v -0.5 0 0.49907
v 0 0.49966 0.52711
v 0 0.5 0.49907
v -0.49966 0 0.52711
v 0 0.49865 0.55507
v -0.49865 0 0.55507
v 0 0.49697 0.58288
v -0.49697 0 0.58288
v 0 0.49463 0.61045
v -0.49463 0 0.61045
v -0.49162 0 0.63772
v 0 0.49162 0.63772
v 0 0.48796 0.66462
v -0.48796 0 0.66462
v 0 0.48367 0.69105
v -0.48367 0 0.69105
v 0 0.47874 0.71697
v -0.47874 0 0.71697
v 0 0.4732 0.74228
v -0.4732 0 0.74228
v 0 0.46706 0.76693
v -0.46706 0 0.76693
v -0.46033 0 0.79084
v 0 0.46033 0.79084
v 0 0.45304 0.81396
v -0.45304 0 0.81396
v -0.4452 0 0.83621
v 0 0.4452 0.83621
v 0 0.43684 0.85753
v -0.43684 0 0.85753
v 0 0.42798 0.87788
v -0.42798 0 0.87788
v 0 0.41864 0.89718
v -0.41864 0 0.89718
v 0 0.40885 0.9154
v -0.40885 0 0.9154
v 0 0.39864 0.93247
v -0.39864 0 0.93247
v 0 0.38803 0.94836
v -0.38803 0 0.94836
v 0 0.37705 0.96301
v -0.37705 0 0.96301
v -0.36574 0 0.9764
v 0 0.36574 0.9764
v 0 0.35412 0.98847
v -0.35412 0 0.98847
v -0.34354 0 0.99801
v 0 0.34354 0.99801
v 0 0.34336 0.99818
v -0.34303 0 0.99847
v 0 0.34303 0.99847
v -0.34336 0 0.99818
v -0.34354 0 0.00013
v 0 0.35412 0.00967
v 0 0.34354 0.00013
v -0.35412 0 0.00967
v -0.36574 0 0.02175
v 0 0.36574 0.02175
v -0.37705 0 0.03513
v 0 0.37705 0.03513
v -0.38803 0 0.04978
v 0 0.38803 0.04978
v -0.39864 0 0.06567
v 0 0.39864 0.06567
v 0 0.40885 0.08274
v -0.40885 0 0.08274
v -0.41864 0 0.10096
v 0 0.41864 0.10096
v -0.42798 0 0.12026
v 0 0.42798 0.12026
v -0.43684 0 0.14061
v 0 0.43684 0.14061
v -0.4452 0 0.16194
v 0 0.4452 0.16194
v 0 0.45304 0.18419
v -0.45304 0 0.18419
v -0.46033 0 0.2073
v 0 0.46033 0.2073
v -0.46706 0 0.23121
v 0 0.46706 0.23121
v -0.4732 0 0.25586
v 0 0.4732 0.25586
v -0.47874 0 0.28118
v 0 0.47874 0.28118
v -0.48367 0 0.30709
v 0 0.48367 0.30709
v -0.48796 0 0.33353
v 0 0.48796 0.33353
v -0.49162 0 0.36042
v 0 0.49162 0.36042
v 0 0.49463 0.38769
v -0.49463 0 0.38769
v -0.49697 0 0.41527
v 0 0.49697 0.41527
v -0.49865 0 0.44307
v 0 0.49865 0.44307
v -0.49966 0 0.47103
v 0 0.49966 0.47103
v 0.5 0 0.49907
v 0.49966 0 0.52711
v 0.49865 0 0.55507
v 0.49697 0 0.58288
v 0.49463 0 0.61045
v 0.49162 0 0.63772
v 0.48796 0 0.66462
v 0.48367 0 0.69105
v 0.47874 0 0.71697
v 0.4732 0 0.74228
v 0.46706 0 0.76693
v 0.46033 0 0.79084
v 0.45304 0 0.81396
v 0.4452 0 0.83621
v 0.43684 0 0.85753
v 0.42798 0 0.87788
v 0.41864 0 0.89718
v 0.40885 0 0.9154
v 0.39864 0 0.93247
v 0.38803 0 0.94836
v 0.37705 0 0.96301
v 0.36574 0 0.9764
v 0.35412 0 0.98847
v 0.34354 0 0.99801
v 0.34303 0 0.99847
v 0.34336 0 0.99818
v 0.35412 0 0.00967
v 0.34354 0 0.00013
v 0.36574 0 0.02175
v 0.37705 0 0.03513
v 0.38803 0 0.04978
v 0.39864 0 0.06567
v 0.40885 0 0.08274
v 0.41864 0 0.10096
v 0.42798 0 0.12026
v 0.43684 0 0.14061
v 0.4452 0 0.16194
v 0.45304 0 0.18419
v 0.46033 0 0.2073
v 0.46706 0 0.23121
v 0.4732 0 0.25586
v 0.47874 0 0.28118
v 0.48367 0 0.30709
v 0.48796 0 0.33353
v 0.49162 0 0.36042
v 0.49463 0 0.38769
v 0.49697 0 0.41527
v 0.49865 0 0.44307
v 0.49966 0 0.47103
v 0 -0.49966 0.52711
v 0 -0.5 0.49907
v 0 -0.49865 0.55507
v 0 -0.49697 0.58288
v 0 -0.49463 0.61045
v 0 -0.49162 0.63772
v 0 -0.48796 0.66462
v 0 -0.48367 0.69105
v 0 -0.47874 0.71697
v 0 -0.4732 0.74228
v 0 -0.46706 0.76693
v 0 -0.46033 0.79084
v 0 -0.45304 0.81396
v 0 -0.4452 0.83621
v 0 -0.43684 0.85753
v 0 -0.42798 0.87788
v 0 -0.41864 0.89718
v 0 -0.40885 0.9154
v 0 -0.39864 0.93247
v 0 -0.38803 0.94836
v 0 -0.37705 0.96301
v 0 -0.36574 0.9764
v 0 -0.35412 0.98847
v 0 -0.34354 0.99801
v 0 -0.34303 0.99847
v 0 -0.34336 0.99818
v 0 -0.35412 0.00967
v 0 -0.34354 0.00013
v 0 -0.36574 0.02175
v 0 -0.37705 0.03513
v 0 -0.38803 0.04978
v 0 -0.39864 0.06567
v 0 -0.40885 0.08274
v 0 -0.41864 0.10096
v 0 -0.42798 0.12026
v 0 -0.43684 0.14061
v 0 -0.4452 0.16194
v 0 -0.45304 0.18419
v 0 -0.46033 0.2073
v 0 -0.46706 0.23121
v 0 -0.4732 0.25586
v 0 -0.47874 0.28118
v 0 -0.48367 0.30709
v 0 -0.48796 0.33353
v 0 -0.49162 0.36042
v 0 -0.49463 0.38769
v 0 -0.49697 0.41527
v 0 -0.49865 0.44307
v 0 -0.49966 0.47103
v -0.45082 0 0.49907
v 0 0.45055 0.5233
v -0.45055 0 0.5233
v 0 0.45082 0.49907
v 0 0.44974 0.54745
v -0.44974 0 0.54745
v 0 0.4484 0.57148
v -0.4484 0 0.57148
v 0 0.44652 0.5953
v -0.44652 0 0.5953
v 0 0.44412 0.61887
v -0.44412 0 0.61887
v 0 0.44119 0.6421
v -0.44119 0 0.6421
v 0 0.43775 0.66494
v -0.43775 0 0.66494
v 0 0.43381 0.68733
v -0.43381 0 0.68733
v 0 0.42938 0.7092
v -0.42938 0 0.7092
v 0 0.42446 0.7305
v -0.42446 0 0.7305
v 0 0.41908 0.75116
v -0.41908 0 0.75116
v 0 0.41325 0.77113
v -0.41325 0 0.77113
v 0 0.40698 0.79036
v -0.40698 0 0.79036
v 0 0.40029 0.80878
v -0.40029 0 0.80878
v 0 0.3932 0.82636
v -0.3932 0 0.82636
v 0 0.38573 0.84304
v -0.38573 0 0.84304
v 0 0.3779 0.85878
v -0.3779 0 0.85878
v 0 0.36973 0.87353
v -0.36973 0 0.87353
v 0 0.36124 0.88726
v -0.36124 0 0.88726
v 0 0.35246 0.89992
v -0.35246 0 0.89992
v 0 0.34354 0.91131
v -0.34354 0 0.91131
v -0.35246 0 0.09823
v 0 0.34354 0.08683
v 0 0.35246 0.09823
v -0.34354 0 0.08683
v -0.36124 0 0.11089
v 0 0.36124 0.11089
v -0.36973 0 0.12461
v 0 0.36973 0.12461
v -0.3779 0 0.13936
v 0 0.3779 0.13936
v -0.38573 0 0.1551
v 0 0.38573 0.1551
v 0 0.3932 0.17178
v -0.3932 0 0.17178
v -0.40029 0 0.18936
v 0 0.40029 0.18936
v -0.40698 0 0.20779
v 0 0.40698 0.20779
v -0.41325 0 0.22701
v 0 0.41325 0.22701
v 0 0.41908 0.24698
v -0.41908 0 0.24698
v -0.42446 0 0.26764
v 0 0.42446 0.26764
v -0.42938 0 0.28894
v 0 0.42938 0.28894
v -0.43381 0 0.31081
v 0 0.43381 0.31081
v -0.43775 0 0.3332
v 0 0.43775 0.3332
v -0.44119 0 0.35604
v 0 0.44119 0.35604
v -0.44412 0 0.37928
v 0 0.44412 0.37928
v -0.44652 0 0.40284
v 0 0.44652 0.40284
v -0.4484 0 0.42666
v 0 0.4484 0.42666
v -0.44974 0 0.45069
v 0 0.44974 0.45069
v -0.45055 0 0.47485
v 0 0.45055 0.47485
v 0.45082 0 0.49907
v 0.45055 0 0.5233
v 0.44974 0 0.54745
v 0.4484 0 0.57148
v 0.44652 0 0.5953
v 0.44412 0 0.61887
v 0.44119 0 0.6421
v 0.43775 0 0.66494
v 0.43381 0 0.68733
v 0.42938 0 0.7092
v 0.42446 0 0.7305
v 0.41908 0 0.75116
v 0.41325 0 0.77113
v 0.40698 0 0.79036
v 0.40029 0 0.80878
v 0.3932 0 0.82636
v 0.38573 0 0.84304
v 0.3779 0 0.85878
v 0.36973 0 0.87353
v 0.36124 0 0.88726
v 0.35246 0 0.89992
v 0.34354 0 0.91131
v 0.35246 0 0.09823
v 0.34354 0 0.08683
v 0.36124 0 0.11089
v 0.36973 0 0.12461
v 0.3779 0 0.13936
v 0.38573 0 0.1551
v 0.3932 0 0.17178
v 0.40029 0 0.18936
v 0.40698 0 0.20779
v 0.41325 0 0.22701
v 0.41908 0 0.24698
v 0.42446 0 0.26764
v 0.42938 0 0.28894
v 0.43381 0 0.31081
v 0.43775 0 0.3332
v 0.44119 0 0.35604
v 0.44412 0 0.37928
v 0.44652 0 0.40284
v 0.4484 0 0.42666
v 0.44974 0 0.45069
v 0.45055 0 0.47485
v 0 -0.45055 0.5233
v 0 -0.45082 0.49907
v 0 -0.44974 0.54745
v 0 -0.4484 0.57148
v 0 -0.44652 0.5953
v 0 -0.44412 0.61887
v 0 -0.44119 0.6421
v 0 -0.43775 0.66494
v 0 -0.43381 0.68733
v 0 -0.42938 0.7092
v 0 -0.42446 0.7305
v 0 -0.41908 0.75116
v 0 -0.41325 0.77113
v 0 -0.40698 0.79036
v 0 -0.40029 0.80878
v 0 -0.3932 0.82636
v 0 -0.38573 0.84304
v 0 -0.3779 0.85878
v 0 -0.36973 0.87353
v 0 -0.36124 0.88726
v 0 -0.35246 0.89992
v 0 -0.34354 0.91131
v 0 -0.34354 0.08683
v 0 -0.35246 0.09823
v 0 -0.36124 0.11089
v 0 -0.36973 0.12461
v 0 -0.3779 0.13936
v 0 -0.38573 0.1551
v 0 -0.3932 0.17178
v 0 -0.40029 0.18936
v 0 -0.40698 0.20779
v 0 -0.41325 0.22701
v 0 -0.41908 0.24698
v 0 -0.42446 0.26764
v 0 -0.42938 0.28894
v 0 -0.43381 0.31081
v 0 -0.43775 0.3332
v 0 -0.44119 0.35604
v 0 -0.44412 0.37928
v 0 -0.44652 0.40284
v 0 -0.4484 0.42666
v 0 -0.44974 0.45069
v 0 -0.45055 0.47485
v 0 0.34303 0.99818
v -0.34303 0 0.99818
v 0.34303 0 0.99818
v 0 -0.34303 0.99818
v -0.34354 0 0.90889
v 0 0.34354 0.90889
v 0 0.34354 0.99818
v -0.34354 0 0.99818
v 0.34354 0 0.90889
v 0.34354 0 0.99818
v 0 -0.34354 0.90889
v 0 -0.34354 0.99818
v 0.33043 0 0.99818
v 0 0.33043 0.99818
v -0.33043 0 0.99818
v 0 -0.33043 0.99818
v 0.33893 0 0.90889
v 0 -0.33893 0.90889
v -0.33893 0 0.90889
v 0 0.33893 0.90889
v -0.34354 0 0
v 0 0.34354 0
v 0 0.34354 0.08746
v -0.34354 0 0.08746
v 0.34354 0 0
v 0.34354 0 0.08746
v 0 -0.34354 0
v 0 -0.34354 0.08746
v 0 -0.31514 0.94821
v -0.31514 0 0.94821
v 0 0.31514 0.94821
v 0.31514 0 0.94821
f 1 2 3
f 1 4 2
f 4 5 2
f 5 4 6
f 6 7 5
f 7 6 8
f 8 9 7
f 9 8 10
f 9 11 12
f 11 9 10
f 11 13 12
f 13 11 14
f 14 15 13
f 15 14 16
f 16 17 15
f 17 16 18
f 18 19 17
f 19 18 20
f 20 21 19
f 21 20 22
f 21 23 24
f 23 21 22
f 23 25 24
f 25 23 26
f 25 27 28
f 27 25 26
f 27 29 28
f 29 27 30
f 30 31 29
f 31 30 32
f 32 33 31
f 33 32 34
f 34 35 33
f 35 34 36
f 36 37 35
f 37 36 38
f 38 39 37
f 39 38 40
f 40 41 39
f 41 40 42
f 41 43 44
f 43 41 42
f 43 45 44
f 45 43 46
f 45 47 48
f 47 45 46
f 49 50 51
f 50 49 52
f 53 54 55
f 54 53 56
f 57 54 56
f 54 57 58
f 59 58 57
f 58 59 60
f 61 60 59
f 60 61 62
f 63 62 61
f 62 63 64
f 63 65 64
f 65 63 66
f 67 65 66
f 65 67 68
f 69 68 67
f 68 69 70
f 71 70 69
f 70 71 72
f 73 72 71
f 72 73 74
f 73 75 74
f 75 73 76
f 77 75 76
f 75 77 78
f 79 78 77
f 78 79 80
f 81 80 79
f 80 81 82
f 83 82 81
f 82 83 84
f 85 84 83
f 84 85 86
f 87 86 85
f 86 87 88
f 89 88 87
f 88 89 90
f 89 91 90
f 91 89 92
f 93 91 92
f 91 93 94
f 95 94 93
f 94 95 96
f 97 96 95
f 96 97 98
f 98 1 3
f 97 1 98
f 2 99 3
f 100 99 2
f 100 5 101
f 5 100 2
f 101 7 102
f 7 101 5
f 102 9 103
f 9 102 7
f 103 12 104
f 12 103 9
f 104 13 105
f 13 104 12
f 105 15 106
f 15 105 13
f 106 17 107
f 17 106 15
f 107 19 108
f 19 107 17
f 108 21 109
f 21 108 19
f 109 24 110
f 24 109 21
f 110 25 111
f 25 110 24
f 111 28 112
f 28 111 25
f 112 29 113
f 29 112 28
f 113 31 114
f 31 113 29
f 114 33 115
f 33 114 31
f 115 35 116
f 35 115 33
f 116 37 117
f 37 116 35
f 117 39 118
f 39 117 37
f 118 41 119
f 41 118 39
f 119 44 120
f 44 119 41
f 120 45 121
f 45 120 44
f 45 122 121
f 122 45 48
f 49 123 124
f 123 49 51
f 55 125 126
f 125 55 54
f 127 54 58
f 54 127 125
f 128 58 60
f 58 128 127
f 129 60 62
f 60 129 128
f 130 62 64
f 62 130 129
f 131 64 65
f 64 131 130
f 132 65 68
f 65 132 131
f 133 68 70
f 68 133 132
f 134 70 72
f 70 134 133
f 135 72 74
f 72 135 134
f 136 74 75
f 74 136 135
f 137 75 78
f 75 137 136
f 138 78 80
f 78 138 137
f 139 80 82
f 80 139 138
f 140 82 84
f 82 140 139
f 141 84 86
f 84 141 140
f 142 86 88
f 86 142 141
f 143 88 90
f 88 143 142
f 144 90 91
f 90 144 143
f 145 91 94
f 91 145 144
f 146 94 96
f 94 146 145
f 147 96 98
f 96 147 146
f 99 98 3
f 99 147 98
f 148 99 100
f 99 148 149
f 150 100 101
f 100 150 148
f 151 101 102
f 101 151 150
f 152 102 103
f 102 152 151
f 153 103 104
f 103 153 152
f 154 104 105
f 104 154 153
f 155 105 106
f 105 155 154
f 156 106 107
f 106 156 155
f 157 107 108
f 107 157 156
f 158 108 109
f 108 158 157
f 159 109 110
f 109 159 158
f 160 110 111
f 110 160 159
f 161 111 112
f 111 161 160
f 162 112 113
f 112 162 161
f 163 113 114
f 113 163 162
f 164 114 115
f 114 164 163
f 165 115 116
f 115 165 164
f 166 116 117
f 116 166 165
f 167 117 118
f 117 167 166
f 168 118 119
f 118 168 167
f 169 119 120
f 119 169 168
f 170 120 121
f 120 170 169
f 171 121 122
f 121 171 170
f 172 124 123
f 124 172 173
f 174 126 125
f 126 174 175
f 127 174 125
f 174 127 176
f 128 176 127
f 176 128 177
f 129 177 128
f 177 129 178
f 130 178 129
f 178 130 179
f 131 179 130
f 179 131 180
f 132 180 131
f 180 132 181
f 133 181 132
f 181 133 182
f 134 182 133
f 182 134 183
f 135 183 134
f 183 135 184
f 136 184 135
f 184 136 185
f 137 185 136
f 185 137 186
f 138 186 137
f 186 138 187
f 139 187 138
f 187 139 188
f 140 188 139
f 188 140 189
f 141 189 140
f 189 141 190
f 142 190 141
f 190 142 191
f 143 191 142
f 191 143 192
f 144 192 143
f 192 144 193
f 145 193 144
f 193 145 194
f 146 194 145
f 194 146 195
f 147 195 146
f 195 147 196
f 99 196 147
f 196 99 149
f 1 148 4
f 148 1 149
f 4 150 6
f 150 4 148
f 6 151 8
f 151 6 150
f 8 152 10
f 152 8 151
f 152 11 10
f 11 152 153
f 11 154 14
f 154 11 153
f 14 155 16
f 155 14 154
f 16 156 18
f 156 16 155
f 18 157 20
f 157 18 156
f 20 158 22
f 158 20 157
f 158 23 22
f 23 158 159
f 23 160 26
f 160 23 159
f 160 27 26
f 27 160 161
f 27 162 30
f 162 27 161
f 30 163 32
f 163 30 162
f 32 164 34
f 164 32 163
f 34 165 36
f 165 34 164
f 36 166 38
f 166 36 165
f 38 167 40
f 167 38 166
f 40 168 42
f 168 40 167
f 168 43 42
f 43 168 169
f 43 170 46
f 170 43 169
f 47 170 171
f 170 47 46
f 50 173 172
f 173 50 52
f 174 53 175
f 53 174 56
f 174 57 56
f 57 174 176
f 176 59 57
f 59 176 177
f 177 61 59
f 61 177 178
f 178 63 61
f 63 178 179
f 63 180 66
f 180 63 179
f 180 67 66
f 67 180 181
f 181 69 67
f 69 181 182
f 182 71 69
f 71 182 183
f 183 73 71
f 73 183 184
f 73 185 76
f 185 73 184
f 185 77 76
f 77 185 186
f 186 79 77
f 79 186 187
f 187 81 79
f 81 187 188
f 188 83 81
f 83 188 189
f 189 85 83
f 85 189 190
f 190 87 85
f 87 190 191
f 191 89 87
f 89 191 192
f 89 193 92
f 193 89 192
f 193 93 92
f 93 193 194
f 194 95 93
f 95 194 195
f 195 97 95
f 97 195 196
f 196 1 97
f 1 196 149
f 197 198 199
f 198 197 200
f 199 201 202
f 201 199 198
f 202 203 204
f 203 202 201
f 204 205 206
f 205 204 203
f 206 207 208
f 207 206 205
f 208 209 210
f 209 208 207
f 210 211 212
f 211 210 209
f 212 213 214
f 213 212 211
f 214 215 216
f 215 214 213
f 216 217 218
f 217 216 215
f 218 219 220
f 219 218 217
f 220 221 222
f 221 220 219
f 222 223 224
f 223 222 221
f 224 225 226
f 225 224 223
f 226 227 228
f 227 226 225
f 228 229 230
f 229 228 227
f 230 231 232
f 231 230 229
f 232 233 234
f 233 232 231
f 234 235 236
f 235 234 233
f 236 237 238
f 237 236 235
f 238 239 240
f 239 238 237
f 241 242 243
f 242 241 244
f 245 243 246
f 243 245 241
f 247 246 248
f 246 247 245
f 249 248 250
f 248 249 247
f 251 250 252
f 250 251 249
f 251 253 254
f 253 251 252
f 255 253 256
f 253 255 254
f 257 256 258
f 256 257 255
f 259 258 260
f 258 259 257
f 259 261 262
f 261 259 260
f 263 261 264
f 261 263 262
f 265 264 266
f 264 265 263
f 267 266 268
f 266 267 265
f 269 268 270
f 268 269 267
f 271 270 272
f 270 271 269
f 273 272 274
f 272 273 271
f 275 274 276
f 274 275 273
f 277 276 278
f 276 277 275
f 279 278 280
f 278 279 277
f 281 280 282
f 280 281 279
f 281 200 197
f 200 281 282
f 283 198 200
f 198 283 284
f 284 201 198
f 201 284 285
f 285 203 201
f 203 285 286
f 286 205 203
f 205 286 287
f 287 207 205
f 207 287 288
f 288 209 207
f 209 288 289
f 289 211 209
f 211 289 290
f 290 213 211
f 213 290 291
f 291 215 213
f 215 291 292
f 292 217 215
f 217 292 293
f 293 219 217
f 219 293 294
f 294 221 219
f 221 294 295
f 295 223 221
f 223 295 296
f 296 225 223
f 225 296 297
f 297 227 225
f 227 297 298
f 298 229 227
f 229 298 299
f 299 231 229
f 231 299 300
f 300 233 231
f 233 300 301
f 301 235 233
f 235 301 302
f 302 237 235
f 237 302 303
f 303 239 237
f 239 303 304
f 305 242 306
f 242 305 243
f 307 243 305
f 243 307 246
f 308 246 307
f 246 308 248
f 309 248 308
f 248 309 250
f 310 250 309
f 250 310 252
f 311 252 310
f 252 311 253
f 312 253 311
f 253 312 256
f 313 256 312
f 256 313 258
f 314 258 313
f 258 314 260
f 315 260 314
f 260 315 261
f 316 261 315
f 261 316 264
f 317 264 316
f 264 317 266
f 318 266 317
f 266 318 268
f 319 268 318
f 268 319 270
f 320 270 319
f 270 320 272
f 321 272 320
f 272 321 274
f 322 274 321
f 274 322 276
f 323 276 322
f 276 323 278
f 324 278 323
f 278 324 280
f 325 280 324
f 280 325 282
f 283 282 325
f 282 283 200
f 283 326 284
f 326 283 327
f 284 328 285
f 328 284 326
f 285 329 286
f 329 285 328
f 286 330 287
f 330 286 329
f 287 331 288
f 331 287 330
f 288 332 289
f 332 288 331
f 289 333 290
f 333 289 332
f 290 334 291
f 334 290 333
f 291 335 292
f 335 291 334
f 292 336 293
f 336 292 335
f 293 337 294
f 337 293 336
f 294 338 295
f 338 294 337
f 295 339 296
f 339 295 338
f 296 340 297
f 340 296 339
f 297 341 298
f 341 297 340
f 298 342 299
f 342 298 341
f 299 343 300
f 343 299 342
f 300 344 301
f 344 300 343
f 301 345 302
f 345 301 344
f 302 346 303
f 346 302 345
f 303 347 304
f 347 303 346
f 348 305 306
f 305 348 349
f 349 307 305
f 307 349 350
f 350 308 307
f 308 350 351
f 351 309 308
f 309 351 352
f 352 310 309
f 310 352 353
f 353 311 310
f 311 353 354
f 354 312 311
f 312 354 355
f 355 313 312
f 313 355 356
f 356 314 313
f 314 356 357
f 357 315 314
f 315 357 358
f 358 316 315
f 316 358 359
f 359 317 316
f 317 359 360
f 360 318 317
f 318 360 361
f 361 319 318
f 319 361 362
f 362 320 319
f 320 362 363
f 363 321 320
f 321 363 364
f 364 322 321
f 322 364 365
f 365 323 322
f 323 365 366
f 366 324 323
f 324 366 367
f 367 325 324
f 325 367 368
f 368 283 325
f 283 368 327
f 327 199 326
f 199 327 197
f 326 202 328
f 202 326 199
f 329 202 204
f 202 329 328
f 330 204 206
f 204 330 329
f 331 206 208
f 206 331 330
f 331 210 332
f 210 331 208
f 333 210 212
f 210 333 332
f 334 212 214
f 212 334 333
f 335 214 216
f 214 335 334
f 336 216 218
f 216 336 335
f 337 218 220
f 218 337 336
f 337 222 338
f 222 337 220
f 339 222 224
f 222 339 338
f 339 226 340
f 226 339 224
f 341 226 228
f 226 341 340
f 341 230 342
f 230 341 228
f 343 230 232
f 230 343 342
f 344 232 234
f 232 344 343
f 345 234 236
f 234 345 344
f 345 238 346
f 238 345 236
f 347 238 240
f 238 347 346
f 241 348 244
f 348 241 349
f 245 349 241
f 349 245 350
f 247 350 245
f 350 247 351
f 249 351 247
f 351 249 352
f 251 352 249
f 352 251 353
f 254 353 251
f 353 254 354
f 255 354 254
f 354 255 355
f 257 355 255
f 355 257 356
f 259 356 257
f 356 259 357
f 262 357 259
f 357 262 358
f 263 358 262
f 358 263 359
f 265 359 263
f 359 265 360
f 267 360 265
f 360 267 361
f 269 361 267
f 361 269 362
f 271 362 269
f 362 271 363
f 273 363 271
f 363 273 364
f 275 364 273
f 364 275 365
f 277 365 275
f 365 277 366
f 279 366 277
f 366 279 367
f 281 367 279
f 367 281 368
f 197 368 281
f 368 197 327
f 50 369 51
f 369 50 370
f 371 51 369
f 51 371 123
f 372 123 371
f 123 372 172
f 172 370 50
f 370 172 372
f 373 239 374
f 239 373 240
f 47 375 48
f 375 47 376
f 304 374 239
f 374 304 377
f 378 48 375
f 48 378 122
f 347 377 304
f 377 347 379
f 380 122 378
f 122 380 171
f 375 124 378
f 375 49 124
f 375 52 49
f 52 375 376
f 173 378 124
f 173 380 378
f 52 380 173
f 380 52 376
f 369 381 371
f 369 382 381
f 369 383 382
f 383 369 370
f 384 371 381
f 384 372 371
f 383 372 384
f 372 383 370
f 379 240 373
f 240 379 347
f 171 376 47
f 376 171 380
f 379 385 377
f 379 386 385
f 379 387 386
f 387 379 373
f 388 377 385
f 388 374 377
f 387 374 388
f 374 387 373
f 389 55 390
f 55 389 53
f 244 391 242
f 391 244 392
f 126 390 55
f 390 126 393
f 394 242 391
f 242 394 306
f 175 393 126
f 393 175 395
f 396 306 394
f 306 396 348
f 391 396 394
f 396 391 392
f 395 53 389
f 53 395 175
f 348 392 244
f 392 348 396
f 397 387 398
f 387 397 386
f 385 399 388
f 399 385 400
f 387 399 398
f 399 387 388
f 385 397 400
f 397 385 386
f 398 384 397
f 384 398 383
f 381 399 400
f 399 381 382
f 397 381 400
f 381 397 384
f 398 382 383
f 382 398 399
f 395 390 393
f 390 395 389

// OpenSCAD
// The shape of pot you'd like
potShape = 0; // [0:14]

// The number of sides (0 for Cylindrical)
numberSides = 4; // [0:100]

drawReceptacle(potShape,numberSides);

module hSphere(r=1,t=0.1,ns,rot) {
	difference() {
		sphere(r);
		sphere(r-t);
	}
}

rotationList=[0,0,0,60,0,-36,60,180/7,0,-20,36,180/11,0,-180/13,180/7,12,0,0,0,0,0,0];

module drawReceptacle(number,sides) {
	ns=(sides<3)?100:sides;
	rotby=(ns>20)?0:rotationList[ns];

		if (number==1) { receptacle3(ns,rotby);
	} else if (number==2) { receptacle1(ns,rotby);
	} else if (number==3) { receptacle2(ns,rotby);
	} else if (number==4) { receptacle5(ns,rotby);
	} else if (number==5) { receptacle6(ns,rotby);
	} else if (number==6) { receptacle7(ns,rotby);
	} else if (number==7) { receptacle4(ns,rotby);
	} else if (number==8) { receptacle8(ns,rotby);
	} else if (number==9) { receptacle9(ns,rotby);
	} else if (number==10) { receptacle10(ns,rotby);
	} else if (number==11) { receptacle11(ns,rotby);
	} else if (number==12) { receptacle14(ns,rotby);
	} else if (number==13) { receptacle12(ns,rotby);
	} else if (number==14) { receptacle13(ns,rotby);
	} else { 
		 receptacle0(ns,rotby);
	}	
}

diameter=50;
height=100;
quality=120;
$fn=quality;
numbsides=100; rotation=0;


module hSphere(r=1,t=0.1,ns,rot) {
	difference() {
		sphere(r);
		sphere(r-t);
	}
}
module hTorus(r=1,t=0.1,ns,rot) {
	scale([1,1,2])difference() {
		rotate([0,0,rot]) rotate_extrude(convexity=15,$fn=ns) translate([r*2/3, 0, 0]) circle(r/3,$fn=quality); 
		rotate([0,0,rot]) scale([1,1,1.2])rotate_extrude(convexity=15,$fn=ns) translate([r*2/3, 0, 0]) circle(r/3-t,$fn=quality); 
	}
}
module nTorus(r=1,t=0.1,ns,rot) {
	scale([1,1,2])difference() {
		rotate([0,0,rot]) rotate_extrude(convexity=15,$fn=ns) translate([r*2/3, 0, 0]) circle(r/3,$fn=quality); 
		rotate([0,0,rot]) scale([1,1,1.1])rotate_extrude(convexity=15,$fn=ns) translate([r*2/3, 0, 0]) circle(r/3-t,$fn=quality); 
	}
}

module receptacle0(ns,rot) {
	intersection() { translate([0,0,0.5])cube(1,center=true);
		scale([1/122,1/122,1/112])translate([0,0,-2.64])difference() {
			scale([1,1,2]) translate([0,0,((30+6)*2*0.813)/2]) union() {
				difference() {
					rotate([0,0,rot]) { rotate_extrude(convexity = 10,$fn=ns) translate([31, 0, 0]) circle(30,$fn=quality);  }
					rotate([0,0,rot]) { scale([1,1,1.08]) rotate_extrude(convexity = 10,$fn=ns) translate([31, 0, 0]) circle(24,$fn=quality); }
					cylinder(31*2.5,31*1.35,31*1.35,center=true,$fn=ns);
				}
				translate([0,0,22.95])cylinder(5,31*1.352,31*1.352,$fn=ns);
				translate([0,0,0-27.95])cylinder(4.9,31*1.352,31*1.352,$fn=ns);
			}
			translate([0,0,108])cylinder(9.1,42,36,center=true,$fn=ns);
			translate([0,0,112])cylinder(9,38,41,center=true,$fn=ns);
		}
	}
}
module receptacle1(ns,rot) {
	intersection() { translate([0,0,0.5])cube(1,center=true);
		scale([1/2,1/2,1/2])translate([0,0,0.5]) union() {
			difference() {
				hTorus(1,0.1,ns,rot);
				cylinder(1.8,0.83,0.83,center=true,$fn=ns);
			}
			scale([1.67,1.67,1]) translate([0,0,-0.5275]) cylinder(0.1,0.498,0.498,center=true,$fn=ns);
		
			difference() {
				union() {
					scale([1.67,1.67,1]) translate([0,0,0.96])  {
						intersection() {
							hTorus(1,0.1,ns,rot);
							cylinder(1.5,0.5,0.5,center=true,$fn=ns);
						}
					}
					rotate([0,0,rot]) translate([0,0,1.442])rotate_extrude(convexity = 10,$fn=ns) translate([0.83, 0, 0]) scale([0.4,1,1])circle(0.1,$fn=quality); 
				}
				union() {
					translate([0,0,0.6])cylinder(0.5,0.85,0.61,center=true,$fn=ns);
					translate([0,0,0.05])cylinder(0.6,0.85,0.85,center=true,$fn=ns);
				}
			}
		}
	}
}
module receptacle2(ns,rot) {
	intersection() { translate([0,0,0.5])cube(1,center=true);
		scale([1/2,1/2,1/3])translate([0,0,0.5]) union() {
			difference() {
				hTorus(1,0.1,ns,rot);
				cylinder(1.8,0.83,0.83,center=true,$fn=ns);
			}
			scale([1.67,1.67,1]) translate([0,0,-0.5275]) cylinder(0.1,0.498,0.498,center=true,$fn=ns);
		
			difference() {
				scale([1,1,2]) union() {
					scale([1.67,1.67,1]) translate([0,0,0.96+((2-1)*-0.29)])  {
						intersection() {
							hTorus(1,0.1,ns,rot);
							cylinder(1.5,0.5,0.5,center=true,$fn=ns);
						}
					}
					rotate([0,0,rot]) translate([0,0,1.442+((2-1)*-0.29)])rotate_extrude(convexity = 10,$fn=ns) translate([0.83, 0, 0]) scale([0.4,1,1])circle(0.1,$fn=quality); 
				}
				union() {
					translate([0,0,0.6])cylinder(0.5,0.85,0.61,center=true,$fn=ns);
					translate([0,0,0.05])cylinder(0.6,0.85,0.85,center=true,$fn=ns);
				}
			}
		}
	}
}
module receptacle3(ns,rot) {
	intersection() { translate([0,0,0.5])cube(1,center=true);
		scale([1/2,1/2,1/1.75])translate([0,0,0.5]) union() {
			difference() {
				hTorus(1,0.1,ns,rot);
				cylinder(1.8,0.83,0.83,center=true,$fn=ns);
			}
			scale([1.67,1.67,1]) translate([0,0,-0.5275]) cylinder(0.1,0.498,0.498,center=true,$fn=ns);
		
			difference() {
				scale([1,1,0.7]) union() {
					scale([1.67,1.67,1]) translate([0,0,1.215])  {
						intersection() {
							hTorus(1,0.1,ns,rot);
							cylinder(1.5,0.5,0.5,center=true,$fn=ns);
						}
					}
					rotate([0,0,rot]) translate([0,0,1.697])rotate_extrude(convexity = 10,$fn=ns) translate([0.83, 0, 0]) scale([0.4,1,1])circle(0.1,$fn=quality); 
				}
				union() {
					translate([0,0,0.6])cylinder(0.5,0.85,0.61,center=true,$fn=ns);
					translate([0,0,0.05])cylinder(0.6,0.85,0.85,center=true,$fn=ns);
				}
			}
		}
	}
}
module receptacle4(ns,rot) {
	intersection() {
		scale([0.5,0.5,0.47])translate([0,0,0.57]) union() {
			difference() {
				hTorus(1,0.1,ns,rot);
				translate([0,0,-1.38])cylinder(1.8,0.83,0.83,center=true,$fn=ns);
				cylinder(1.8,0.65,0.65,center=true,$fn=ns);
				translate([0,0,0.5])cylinder(1,1.1,1.1,center=true,$fn=ns);
			}
			scale([1.67,1.67,1]) translate([0,0,-0.5275]) cylinder(0.1,0.498,0.498,center=true,$fn=ns);
			translate([0,0,0.75])difference() {
				cylinder(1.5,1,1,center=true,$fn=ns);
				cylinder(2,0.9,0.9,center=true,$fn=ns);
			}
			rotate([0,0,rot]) translate([0,0,1.5])rotate_extrude(convexity = 10,$fn=ns) translate([0.95, 0, 0]) circle(0.05,$fn=quality); 
		}
		translate([0,0,0.5]) cube(1,center=true);
	}
}
module receptacle5(ns,rot) {
	intersection() {
		scale([0.39,0.39,0.445])translate([0,0,0.5752]) union() {
			difference() {
				hTorus(1,0.1,ns,rot);
				translate([0,0,-1.38])cylinder(1.8,0.83,0.83,center=true,$fn=ns);
				cylinder(1.8,0.65,0.65,center=true,$fn=ns);
				translate([0,0,0.5])cylinder(1,1.1,1.1,center=true,$fn=ns);
			}
			scale([1.67,1.67,1]) translate([0,0,-0.5275]) cylinder(0.1,0.498,0.498,center=true,$fn=ns);
			translate([0,0,0.5])difference() {
				cylinder(1,1,1,center=true,$fn=ns);
				cylinder(2,0.9,0.9,center=true,$fn=ns);
			}
			rotate([0,0,rot]) translate([0,0,1.61])rotate_extrude(convexity = 10,$fn=ns) translate([1.24, 0, 0]) scale([1,3,1])circle(0.025,$fn=quality); 
			scale([2.515,2.515,2])translate([0,0,0.25]) intersection() {
					nTorus(1,0.041,ns,rot);
					cylinder(1.5,0.5,0.5,center=true,$fn=ns);
					translate([0,0,0.5])cylinder(0.5,1,1,center=true,$fn=ns);
				}
		}
		translate([0,0,0.5]) cube(1,center=true);
	}
}
module receptacle6(ns,rot) {
	intersection() {
		scale([0.39,0.39,0.57])translate([0,0,0.5752]) union() {
			difference() {
				hTorus(1,0.1,ns,rot);
				translate([0,0,-1.38])cylinder(1.8,0.83,0.83,center=true,$fn=ns);
				cylinder(1.8,0.65,0.65,center=true,$fn=ns);
				translate([0,0,0.5])cylinder(1,1.1,1.1,center=true,$fn=ns);
			}
			scale([1.67,1.67,1]) translate([0,0,-0.5275]) cylinder(0.1,0.498,0.498,center=true,$fn=ns);
			translate([0,0,0.25])difference() {
				cylinder(0.5,1,1,center=true,$fn=ns);
				cylinder(2,0.9,0.9,center=true,$fn=ns);
			}
			rotate([0,0,rot]) translate([0,0,1.11])rotate_extrude(convexity = 10,$fn=ns) translate([1.24, 0, 0]) scale([1,3,1])circle(0.025,$fn=quality); 
			scale([2.515,2.515,2])translate([0,0,0]) intersection() {
					nTorus(1,0.041,ns,rot);
					cylinder(1.5,0.5,0.5,center=true,$fn=ns);
					translate([0,0,0.5])cylinder(0.5,1,1,center=true,$fn=ns);
				}
		}
		translate([0,0,0.5]) cube(1,center=true);
	}
}
module receptacle7(ns,rot) {
	intersection() {
		scale([0.39,0.39,0.8])translate([0,0,0.5752]) union() {
			difference() {
				hTorus(1,0.1,ns,rot);
				translate([0,0,-1.38])cylinder(1.8,0.83,0.83,center=true,$fn=ns);
				cylinder(1.8,0.65,0.65,center=true,$fn=ns);
				translate([0,0,0.5])cylinder(1,1.1,1.1,center=true,$fn=ns);
			}
			scale([1.67,1.67,1]) translate([0,0,-0.5275]) cylinder(0.1,0.498,0.498,center=true,$fn=ns);
			rotate([0,0,rot]) translate([0,0,0.61])rotate_extrude(convexity = 10,$fn=ns) translate([1.24, 0, 0]) scale([1,3,1])circle(0.025,$fn=quality); 
			scale([2.515,2.515,2])translate([0,0,-0.25]) intersection() {
					nTorus(1,0.041,ns,rot);
					cylinder(1.5,0.5,0.5,center=true,$fn=ns);
					translate([0,0,0.5])cylinder(0.5,1,1,center=true,$fn=ns);
				}
		}
		translate([0,0,0.5]) cube(1,center=true);
	}
}
module receptacle8(ns,rot) {
	intersection() {
		scale([0.5,0.5,0.48])translate([0,0,0.5]) union() {
			translate([0,0,0.25])difference() {
				cylinder(1.5,1,1,center=true,$fn=ns);
				cylinder(2,0.9,0.9,center=true,$fn=ns);
			}
			translate([0,0,-0.45]) cylinder(0.1,1,1,center=true,$fn=ns);
			translate([0,0,1])rotate([180,0,0])difference() {
				hTorus(1,0.1,ns,rot);
				translate([0,0,-1.25])cylinder(1.8,0.83,0.83,center=true,$fn=ns);
				cylinder(1.8,0.65,0.65,center=true,$fn=ns);
				translate([0,0,0.5])cylinder(1,1.1,1.1,center=true,$fn=ns);
			}
			rotate([0,0,rot]) translate([0,0,1.493])rotate_extrude(convexity = 10,$fn=ns) translate([0.83, 0, 0]) scale([1,3.5,1])circle(0.025,$fn=quality); 
		}
		translate([0,0,0.5]) cube(1,center=true);
	}
}

module receptacle9(ns,rot) {
	intersection() {
		scale([0.5,0.5,0.48])translate([0,0,0.5]) union() {
			translate([0,0,0.25])difference() {
				cylinder(2.5,1,1,center=true,$fn=ns);
				cylinder(2.6,0.9,0.9,center=true,$fn=ns);
			}
			translate([0,0,-0.45]) cylinder(0.1,1,1,center=true,$fn=ns);
			rotate([0,0,rot]) translate([0,0,1.5])rotate_extrude(convexity = 10,$fn=ns) translate([0.95, 0, 0]) circle(0.05,$fn=quality); 
		}
		translate([0,0,0.5]) cube(1,center=true);
	}
}

module receptacle10(ns,rot) {
	intersection() {
		scale([0.5,0.5,0.48])translate([0,0,0.5]) union() {
			scale([2,2,2])translate([0,0,0.25]) intersection() {
					nTorus(1,0.041,ns,rot);
					cylinder(1.5,0.5,0.5,center=true,$fn=ns);
					translate([0,0,0.5])cylinder(0.5,1,1,center=true,$fn=ns);
				}
			translate([0,0,0.25])difference() {
				cylinder(1.5,0.795,0.795,center=true,$fn=ns);
				cylinder(2.1,0.717,0.717,center=true,$fn=ns);
			}
			translate([0,0,-0.45]) cylinder(0.1,0.795,0.795,center=true,$fn=ns);
		}
		translate([0,0,0.5]) cube(1,center=true);
	}
}
module receptacle11(ns,rot) {
	intersection() {
		scale([0.5,0.5,0.48])translate([0,0,0.5]) union() {
			scale([2,2,2])translate([0,0,0.25]) intersection() {
					nTorus(1,0.041,ns,rot);
					cylinder(1.5,0.5,0.5,center=true,$fn=ns);
					translate([0,0,-0.5])cylinder(0.5,1,1,center=true,$fn=ns);
				}
			translate([0,0,0.75])difference() {
				cylinder(1.5,0.795,0.795,center=true,$fn=ns);
				cylinder(2.1,0.717,0.717,center=true,$fn=ns);
			}
			translate([0,0,-0.45]) cylinder(0.1,0.95,0.9,center=true,$fn=ns);
			rotate([0,0,rot]) translate([0,0,1.5])rotate_extrude(convexity = 10,$fn=ns) translate([0.76, 0, 0]) circle(0.035,$fn=quality); 
		}
		translate([0,0,0.5]) cube(1,center=true);
	}
}
module receptacle12(ns,rot) {
	intersection() {
		scale([0.5,0.5,0.48])translate([0,0,0.5]) union() {
			translate([0,0,0.25])difference() {
				cylinder(2.5,0.5,1,center=true,$fn=ns);
				cylinder(2.6,0.4,0.9,center=true,$fn=ns);
			}
			translate([0,0,-0.45]) cylinder(0.1,0.55,0.55,center=true,$fn=ns);
			rotate([0,0,rot]) translate([0,0,1.5])rotate_extrude(convexity = 10,$fn=ns) translate([0.947, 0, 0]) circle(0.052,$fn=quality); 
		}
		translate([0,0,0.5]) cube(1,center=true);
	}
}
module receptacle13(ns,rot) {
	intersection() {
		scale([0.5,0.5,0.48])translate([0,0,0.5]) union() {
			translate([0,0,0.25])difference() {
				cylinder(2.5,1,0.6,center=true,$fn=ns);
				cylinder(2.6,0.9,0.5,center=true,$fn=ns);
			}
			translate([0,0,-0.45]) cylinder(0.1,0.9,0.9,center=true,$fn=ns);
			rotate([0,0,rot]) translate([0,0,1.5])rotate_extrude(convexity = 10,$fn=ns) translate([0.554, 0, 0]) circle(0.045,$fn=quality); 
		}
		translate([0,0,0.5]) cube(1,center=true);
	}
}

module receptacle14(ns,rot) {
	intersection() {
		scale([0.5,0.5,0.48])translate([0,0,0.5]) union() {
			scale([2,2,2])translate([0,0,0.25]) intersection() {
					nTorus(1,0.041,ns,rot);
					cylinder(1.5,0.5,0.5,center=true,$fn=ns);
					translate([0,0,0.5])cylinder(0.5,1,1,center=true,$fn=ns);
				}
			translate([0,0,0.5])difference() {
				cylinder(1,0.795,0.795,center=true,$fn=ns);
				cylinder(2.1,0.717,0.717,center=true,$fn=ns);
			}
			scale([2,2,2])translate([0,0,0.25]) intersection() {
					nTorus(1,0.041,ns,rot);
					cylinder(1.5,0.5,0.5,center=true,$fn=ns);
					translate([0,0,-0.5])cylinder(0.5,1,1,center=true,$fn=ns);
				}
			translate([0,0,-0.45]) cylinder(0.1,0.95,0.9,center=true,$fn=ns);
		}
		translate([0,0,0.5]) cube(1,center=true);
	}
}
